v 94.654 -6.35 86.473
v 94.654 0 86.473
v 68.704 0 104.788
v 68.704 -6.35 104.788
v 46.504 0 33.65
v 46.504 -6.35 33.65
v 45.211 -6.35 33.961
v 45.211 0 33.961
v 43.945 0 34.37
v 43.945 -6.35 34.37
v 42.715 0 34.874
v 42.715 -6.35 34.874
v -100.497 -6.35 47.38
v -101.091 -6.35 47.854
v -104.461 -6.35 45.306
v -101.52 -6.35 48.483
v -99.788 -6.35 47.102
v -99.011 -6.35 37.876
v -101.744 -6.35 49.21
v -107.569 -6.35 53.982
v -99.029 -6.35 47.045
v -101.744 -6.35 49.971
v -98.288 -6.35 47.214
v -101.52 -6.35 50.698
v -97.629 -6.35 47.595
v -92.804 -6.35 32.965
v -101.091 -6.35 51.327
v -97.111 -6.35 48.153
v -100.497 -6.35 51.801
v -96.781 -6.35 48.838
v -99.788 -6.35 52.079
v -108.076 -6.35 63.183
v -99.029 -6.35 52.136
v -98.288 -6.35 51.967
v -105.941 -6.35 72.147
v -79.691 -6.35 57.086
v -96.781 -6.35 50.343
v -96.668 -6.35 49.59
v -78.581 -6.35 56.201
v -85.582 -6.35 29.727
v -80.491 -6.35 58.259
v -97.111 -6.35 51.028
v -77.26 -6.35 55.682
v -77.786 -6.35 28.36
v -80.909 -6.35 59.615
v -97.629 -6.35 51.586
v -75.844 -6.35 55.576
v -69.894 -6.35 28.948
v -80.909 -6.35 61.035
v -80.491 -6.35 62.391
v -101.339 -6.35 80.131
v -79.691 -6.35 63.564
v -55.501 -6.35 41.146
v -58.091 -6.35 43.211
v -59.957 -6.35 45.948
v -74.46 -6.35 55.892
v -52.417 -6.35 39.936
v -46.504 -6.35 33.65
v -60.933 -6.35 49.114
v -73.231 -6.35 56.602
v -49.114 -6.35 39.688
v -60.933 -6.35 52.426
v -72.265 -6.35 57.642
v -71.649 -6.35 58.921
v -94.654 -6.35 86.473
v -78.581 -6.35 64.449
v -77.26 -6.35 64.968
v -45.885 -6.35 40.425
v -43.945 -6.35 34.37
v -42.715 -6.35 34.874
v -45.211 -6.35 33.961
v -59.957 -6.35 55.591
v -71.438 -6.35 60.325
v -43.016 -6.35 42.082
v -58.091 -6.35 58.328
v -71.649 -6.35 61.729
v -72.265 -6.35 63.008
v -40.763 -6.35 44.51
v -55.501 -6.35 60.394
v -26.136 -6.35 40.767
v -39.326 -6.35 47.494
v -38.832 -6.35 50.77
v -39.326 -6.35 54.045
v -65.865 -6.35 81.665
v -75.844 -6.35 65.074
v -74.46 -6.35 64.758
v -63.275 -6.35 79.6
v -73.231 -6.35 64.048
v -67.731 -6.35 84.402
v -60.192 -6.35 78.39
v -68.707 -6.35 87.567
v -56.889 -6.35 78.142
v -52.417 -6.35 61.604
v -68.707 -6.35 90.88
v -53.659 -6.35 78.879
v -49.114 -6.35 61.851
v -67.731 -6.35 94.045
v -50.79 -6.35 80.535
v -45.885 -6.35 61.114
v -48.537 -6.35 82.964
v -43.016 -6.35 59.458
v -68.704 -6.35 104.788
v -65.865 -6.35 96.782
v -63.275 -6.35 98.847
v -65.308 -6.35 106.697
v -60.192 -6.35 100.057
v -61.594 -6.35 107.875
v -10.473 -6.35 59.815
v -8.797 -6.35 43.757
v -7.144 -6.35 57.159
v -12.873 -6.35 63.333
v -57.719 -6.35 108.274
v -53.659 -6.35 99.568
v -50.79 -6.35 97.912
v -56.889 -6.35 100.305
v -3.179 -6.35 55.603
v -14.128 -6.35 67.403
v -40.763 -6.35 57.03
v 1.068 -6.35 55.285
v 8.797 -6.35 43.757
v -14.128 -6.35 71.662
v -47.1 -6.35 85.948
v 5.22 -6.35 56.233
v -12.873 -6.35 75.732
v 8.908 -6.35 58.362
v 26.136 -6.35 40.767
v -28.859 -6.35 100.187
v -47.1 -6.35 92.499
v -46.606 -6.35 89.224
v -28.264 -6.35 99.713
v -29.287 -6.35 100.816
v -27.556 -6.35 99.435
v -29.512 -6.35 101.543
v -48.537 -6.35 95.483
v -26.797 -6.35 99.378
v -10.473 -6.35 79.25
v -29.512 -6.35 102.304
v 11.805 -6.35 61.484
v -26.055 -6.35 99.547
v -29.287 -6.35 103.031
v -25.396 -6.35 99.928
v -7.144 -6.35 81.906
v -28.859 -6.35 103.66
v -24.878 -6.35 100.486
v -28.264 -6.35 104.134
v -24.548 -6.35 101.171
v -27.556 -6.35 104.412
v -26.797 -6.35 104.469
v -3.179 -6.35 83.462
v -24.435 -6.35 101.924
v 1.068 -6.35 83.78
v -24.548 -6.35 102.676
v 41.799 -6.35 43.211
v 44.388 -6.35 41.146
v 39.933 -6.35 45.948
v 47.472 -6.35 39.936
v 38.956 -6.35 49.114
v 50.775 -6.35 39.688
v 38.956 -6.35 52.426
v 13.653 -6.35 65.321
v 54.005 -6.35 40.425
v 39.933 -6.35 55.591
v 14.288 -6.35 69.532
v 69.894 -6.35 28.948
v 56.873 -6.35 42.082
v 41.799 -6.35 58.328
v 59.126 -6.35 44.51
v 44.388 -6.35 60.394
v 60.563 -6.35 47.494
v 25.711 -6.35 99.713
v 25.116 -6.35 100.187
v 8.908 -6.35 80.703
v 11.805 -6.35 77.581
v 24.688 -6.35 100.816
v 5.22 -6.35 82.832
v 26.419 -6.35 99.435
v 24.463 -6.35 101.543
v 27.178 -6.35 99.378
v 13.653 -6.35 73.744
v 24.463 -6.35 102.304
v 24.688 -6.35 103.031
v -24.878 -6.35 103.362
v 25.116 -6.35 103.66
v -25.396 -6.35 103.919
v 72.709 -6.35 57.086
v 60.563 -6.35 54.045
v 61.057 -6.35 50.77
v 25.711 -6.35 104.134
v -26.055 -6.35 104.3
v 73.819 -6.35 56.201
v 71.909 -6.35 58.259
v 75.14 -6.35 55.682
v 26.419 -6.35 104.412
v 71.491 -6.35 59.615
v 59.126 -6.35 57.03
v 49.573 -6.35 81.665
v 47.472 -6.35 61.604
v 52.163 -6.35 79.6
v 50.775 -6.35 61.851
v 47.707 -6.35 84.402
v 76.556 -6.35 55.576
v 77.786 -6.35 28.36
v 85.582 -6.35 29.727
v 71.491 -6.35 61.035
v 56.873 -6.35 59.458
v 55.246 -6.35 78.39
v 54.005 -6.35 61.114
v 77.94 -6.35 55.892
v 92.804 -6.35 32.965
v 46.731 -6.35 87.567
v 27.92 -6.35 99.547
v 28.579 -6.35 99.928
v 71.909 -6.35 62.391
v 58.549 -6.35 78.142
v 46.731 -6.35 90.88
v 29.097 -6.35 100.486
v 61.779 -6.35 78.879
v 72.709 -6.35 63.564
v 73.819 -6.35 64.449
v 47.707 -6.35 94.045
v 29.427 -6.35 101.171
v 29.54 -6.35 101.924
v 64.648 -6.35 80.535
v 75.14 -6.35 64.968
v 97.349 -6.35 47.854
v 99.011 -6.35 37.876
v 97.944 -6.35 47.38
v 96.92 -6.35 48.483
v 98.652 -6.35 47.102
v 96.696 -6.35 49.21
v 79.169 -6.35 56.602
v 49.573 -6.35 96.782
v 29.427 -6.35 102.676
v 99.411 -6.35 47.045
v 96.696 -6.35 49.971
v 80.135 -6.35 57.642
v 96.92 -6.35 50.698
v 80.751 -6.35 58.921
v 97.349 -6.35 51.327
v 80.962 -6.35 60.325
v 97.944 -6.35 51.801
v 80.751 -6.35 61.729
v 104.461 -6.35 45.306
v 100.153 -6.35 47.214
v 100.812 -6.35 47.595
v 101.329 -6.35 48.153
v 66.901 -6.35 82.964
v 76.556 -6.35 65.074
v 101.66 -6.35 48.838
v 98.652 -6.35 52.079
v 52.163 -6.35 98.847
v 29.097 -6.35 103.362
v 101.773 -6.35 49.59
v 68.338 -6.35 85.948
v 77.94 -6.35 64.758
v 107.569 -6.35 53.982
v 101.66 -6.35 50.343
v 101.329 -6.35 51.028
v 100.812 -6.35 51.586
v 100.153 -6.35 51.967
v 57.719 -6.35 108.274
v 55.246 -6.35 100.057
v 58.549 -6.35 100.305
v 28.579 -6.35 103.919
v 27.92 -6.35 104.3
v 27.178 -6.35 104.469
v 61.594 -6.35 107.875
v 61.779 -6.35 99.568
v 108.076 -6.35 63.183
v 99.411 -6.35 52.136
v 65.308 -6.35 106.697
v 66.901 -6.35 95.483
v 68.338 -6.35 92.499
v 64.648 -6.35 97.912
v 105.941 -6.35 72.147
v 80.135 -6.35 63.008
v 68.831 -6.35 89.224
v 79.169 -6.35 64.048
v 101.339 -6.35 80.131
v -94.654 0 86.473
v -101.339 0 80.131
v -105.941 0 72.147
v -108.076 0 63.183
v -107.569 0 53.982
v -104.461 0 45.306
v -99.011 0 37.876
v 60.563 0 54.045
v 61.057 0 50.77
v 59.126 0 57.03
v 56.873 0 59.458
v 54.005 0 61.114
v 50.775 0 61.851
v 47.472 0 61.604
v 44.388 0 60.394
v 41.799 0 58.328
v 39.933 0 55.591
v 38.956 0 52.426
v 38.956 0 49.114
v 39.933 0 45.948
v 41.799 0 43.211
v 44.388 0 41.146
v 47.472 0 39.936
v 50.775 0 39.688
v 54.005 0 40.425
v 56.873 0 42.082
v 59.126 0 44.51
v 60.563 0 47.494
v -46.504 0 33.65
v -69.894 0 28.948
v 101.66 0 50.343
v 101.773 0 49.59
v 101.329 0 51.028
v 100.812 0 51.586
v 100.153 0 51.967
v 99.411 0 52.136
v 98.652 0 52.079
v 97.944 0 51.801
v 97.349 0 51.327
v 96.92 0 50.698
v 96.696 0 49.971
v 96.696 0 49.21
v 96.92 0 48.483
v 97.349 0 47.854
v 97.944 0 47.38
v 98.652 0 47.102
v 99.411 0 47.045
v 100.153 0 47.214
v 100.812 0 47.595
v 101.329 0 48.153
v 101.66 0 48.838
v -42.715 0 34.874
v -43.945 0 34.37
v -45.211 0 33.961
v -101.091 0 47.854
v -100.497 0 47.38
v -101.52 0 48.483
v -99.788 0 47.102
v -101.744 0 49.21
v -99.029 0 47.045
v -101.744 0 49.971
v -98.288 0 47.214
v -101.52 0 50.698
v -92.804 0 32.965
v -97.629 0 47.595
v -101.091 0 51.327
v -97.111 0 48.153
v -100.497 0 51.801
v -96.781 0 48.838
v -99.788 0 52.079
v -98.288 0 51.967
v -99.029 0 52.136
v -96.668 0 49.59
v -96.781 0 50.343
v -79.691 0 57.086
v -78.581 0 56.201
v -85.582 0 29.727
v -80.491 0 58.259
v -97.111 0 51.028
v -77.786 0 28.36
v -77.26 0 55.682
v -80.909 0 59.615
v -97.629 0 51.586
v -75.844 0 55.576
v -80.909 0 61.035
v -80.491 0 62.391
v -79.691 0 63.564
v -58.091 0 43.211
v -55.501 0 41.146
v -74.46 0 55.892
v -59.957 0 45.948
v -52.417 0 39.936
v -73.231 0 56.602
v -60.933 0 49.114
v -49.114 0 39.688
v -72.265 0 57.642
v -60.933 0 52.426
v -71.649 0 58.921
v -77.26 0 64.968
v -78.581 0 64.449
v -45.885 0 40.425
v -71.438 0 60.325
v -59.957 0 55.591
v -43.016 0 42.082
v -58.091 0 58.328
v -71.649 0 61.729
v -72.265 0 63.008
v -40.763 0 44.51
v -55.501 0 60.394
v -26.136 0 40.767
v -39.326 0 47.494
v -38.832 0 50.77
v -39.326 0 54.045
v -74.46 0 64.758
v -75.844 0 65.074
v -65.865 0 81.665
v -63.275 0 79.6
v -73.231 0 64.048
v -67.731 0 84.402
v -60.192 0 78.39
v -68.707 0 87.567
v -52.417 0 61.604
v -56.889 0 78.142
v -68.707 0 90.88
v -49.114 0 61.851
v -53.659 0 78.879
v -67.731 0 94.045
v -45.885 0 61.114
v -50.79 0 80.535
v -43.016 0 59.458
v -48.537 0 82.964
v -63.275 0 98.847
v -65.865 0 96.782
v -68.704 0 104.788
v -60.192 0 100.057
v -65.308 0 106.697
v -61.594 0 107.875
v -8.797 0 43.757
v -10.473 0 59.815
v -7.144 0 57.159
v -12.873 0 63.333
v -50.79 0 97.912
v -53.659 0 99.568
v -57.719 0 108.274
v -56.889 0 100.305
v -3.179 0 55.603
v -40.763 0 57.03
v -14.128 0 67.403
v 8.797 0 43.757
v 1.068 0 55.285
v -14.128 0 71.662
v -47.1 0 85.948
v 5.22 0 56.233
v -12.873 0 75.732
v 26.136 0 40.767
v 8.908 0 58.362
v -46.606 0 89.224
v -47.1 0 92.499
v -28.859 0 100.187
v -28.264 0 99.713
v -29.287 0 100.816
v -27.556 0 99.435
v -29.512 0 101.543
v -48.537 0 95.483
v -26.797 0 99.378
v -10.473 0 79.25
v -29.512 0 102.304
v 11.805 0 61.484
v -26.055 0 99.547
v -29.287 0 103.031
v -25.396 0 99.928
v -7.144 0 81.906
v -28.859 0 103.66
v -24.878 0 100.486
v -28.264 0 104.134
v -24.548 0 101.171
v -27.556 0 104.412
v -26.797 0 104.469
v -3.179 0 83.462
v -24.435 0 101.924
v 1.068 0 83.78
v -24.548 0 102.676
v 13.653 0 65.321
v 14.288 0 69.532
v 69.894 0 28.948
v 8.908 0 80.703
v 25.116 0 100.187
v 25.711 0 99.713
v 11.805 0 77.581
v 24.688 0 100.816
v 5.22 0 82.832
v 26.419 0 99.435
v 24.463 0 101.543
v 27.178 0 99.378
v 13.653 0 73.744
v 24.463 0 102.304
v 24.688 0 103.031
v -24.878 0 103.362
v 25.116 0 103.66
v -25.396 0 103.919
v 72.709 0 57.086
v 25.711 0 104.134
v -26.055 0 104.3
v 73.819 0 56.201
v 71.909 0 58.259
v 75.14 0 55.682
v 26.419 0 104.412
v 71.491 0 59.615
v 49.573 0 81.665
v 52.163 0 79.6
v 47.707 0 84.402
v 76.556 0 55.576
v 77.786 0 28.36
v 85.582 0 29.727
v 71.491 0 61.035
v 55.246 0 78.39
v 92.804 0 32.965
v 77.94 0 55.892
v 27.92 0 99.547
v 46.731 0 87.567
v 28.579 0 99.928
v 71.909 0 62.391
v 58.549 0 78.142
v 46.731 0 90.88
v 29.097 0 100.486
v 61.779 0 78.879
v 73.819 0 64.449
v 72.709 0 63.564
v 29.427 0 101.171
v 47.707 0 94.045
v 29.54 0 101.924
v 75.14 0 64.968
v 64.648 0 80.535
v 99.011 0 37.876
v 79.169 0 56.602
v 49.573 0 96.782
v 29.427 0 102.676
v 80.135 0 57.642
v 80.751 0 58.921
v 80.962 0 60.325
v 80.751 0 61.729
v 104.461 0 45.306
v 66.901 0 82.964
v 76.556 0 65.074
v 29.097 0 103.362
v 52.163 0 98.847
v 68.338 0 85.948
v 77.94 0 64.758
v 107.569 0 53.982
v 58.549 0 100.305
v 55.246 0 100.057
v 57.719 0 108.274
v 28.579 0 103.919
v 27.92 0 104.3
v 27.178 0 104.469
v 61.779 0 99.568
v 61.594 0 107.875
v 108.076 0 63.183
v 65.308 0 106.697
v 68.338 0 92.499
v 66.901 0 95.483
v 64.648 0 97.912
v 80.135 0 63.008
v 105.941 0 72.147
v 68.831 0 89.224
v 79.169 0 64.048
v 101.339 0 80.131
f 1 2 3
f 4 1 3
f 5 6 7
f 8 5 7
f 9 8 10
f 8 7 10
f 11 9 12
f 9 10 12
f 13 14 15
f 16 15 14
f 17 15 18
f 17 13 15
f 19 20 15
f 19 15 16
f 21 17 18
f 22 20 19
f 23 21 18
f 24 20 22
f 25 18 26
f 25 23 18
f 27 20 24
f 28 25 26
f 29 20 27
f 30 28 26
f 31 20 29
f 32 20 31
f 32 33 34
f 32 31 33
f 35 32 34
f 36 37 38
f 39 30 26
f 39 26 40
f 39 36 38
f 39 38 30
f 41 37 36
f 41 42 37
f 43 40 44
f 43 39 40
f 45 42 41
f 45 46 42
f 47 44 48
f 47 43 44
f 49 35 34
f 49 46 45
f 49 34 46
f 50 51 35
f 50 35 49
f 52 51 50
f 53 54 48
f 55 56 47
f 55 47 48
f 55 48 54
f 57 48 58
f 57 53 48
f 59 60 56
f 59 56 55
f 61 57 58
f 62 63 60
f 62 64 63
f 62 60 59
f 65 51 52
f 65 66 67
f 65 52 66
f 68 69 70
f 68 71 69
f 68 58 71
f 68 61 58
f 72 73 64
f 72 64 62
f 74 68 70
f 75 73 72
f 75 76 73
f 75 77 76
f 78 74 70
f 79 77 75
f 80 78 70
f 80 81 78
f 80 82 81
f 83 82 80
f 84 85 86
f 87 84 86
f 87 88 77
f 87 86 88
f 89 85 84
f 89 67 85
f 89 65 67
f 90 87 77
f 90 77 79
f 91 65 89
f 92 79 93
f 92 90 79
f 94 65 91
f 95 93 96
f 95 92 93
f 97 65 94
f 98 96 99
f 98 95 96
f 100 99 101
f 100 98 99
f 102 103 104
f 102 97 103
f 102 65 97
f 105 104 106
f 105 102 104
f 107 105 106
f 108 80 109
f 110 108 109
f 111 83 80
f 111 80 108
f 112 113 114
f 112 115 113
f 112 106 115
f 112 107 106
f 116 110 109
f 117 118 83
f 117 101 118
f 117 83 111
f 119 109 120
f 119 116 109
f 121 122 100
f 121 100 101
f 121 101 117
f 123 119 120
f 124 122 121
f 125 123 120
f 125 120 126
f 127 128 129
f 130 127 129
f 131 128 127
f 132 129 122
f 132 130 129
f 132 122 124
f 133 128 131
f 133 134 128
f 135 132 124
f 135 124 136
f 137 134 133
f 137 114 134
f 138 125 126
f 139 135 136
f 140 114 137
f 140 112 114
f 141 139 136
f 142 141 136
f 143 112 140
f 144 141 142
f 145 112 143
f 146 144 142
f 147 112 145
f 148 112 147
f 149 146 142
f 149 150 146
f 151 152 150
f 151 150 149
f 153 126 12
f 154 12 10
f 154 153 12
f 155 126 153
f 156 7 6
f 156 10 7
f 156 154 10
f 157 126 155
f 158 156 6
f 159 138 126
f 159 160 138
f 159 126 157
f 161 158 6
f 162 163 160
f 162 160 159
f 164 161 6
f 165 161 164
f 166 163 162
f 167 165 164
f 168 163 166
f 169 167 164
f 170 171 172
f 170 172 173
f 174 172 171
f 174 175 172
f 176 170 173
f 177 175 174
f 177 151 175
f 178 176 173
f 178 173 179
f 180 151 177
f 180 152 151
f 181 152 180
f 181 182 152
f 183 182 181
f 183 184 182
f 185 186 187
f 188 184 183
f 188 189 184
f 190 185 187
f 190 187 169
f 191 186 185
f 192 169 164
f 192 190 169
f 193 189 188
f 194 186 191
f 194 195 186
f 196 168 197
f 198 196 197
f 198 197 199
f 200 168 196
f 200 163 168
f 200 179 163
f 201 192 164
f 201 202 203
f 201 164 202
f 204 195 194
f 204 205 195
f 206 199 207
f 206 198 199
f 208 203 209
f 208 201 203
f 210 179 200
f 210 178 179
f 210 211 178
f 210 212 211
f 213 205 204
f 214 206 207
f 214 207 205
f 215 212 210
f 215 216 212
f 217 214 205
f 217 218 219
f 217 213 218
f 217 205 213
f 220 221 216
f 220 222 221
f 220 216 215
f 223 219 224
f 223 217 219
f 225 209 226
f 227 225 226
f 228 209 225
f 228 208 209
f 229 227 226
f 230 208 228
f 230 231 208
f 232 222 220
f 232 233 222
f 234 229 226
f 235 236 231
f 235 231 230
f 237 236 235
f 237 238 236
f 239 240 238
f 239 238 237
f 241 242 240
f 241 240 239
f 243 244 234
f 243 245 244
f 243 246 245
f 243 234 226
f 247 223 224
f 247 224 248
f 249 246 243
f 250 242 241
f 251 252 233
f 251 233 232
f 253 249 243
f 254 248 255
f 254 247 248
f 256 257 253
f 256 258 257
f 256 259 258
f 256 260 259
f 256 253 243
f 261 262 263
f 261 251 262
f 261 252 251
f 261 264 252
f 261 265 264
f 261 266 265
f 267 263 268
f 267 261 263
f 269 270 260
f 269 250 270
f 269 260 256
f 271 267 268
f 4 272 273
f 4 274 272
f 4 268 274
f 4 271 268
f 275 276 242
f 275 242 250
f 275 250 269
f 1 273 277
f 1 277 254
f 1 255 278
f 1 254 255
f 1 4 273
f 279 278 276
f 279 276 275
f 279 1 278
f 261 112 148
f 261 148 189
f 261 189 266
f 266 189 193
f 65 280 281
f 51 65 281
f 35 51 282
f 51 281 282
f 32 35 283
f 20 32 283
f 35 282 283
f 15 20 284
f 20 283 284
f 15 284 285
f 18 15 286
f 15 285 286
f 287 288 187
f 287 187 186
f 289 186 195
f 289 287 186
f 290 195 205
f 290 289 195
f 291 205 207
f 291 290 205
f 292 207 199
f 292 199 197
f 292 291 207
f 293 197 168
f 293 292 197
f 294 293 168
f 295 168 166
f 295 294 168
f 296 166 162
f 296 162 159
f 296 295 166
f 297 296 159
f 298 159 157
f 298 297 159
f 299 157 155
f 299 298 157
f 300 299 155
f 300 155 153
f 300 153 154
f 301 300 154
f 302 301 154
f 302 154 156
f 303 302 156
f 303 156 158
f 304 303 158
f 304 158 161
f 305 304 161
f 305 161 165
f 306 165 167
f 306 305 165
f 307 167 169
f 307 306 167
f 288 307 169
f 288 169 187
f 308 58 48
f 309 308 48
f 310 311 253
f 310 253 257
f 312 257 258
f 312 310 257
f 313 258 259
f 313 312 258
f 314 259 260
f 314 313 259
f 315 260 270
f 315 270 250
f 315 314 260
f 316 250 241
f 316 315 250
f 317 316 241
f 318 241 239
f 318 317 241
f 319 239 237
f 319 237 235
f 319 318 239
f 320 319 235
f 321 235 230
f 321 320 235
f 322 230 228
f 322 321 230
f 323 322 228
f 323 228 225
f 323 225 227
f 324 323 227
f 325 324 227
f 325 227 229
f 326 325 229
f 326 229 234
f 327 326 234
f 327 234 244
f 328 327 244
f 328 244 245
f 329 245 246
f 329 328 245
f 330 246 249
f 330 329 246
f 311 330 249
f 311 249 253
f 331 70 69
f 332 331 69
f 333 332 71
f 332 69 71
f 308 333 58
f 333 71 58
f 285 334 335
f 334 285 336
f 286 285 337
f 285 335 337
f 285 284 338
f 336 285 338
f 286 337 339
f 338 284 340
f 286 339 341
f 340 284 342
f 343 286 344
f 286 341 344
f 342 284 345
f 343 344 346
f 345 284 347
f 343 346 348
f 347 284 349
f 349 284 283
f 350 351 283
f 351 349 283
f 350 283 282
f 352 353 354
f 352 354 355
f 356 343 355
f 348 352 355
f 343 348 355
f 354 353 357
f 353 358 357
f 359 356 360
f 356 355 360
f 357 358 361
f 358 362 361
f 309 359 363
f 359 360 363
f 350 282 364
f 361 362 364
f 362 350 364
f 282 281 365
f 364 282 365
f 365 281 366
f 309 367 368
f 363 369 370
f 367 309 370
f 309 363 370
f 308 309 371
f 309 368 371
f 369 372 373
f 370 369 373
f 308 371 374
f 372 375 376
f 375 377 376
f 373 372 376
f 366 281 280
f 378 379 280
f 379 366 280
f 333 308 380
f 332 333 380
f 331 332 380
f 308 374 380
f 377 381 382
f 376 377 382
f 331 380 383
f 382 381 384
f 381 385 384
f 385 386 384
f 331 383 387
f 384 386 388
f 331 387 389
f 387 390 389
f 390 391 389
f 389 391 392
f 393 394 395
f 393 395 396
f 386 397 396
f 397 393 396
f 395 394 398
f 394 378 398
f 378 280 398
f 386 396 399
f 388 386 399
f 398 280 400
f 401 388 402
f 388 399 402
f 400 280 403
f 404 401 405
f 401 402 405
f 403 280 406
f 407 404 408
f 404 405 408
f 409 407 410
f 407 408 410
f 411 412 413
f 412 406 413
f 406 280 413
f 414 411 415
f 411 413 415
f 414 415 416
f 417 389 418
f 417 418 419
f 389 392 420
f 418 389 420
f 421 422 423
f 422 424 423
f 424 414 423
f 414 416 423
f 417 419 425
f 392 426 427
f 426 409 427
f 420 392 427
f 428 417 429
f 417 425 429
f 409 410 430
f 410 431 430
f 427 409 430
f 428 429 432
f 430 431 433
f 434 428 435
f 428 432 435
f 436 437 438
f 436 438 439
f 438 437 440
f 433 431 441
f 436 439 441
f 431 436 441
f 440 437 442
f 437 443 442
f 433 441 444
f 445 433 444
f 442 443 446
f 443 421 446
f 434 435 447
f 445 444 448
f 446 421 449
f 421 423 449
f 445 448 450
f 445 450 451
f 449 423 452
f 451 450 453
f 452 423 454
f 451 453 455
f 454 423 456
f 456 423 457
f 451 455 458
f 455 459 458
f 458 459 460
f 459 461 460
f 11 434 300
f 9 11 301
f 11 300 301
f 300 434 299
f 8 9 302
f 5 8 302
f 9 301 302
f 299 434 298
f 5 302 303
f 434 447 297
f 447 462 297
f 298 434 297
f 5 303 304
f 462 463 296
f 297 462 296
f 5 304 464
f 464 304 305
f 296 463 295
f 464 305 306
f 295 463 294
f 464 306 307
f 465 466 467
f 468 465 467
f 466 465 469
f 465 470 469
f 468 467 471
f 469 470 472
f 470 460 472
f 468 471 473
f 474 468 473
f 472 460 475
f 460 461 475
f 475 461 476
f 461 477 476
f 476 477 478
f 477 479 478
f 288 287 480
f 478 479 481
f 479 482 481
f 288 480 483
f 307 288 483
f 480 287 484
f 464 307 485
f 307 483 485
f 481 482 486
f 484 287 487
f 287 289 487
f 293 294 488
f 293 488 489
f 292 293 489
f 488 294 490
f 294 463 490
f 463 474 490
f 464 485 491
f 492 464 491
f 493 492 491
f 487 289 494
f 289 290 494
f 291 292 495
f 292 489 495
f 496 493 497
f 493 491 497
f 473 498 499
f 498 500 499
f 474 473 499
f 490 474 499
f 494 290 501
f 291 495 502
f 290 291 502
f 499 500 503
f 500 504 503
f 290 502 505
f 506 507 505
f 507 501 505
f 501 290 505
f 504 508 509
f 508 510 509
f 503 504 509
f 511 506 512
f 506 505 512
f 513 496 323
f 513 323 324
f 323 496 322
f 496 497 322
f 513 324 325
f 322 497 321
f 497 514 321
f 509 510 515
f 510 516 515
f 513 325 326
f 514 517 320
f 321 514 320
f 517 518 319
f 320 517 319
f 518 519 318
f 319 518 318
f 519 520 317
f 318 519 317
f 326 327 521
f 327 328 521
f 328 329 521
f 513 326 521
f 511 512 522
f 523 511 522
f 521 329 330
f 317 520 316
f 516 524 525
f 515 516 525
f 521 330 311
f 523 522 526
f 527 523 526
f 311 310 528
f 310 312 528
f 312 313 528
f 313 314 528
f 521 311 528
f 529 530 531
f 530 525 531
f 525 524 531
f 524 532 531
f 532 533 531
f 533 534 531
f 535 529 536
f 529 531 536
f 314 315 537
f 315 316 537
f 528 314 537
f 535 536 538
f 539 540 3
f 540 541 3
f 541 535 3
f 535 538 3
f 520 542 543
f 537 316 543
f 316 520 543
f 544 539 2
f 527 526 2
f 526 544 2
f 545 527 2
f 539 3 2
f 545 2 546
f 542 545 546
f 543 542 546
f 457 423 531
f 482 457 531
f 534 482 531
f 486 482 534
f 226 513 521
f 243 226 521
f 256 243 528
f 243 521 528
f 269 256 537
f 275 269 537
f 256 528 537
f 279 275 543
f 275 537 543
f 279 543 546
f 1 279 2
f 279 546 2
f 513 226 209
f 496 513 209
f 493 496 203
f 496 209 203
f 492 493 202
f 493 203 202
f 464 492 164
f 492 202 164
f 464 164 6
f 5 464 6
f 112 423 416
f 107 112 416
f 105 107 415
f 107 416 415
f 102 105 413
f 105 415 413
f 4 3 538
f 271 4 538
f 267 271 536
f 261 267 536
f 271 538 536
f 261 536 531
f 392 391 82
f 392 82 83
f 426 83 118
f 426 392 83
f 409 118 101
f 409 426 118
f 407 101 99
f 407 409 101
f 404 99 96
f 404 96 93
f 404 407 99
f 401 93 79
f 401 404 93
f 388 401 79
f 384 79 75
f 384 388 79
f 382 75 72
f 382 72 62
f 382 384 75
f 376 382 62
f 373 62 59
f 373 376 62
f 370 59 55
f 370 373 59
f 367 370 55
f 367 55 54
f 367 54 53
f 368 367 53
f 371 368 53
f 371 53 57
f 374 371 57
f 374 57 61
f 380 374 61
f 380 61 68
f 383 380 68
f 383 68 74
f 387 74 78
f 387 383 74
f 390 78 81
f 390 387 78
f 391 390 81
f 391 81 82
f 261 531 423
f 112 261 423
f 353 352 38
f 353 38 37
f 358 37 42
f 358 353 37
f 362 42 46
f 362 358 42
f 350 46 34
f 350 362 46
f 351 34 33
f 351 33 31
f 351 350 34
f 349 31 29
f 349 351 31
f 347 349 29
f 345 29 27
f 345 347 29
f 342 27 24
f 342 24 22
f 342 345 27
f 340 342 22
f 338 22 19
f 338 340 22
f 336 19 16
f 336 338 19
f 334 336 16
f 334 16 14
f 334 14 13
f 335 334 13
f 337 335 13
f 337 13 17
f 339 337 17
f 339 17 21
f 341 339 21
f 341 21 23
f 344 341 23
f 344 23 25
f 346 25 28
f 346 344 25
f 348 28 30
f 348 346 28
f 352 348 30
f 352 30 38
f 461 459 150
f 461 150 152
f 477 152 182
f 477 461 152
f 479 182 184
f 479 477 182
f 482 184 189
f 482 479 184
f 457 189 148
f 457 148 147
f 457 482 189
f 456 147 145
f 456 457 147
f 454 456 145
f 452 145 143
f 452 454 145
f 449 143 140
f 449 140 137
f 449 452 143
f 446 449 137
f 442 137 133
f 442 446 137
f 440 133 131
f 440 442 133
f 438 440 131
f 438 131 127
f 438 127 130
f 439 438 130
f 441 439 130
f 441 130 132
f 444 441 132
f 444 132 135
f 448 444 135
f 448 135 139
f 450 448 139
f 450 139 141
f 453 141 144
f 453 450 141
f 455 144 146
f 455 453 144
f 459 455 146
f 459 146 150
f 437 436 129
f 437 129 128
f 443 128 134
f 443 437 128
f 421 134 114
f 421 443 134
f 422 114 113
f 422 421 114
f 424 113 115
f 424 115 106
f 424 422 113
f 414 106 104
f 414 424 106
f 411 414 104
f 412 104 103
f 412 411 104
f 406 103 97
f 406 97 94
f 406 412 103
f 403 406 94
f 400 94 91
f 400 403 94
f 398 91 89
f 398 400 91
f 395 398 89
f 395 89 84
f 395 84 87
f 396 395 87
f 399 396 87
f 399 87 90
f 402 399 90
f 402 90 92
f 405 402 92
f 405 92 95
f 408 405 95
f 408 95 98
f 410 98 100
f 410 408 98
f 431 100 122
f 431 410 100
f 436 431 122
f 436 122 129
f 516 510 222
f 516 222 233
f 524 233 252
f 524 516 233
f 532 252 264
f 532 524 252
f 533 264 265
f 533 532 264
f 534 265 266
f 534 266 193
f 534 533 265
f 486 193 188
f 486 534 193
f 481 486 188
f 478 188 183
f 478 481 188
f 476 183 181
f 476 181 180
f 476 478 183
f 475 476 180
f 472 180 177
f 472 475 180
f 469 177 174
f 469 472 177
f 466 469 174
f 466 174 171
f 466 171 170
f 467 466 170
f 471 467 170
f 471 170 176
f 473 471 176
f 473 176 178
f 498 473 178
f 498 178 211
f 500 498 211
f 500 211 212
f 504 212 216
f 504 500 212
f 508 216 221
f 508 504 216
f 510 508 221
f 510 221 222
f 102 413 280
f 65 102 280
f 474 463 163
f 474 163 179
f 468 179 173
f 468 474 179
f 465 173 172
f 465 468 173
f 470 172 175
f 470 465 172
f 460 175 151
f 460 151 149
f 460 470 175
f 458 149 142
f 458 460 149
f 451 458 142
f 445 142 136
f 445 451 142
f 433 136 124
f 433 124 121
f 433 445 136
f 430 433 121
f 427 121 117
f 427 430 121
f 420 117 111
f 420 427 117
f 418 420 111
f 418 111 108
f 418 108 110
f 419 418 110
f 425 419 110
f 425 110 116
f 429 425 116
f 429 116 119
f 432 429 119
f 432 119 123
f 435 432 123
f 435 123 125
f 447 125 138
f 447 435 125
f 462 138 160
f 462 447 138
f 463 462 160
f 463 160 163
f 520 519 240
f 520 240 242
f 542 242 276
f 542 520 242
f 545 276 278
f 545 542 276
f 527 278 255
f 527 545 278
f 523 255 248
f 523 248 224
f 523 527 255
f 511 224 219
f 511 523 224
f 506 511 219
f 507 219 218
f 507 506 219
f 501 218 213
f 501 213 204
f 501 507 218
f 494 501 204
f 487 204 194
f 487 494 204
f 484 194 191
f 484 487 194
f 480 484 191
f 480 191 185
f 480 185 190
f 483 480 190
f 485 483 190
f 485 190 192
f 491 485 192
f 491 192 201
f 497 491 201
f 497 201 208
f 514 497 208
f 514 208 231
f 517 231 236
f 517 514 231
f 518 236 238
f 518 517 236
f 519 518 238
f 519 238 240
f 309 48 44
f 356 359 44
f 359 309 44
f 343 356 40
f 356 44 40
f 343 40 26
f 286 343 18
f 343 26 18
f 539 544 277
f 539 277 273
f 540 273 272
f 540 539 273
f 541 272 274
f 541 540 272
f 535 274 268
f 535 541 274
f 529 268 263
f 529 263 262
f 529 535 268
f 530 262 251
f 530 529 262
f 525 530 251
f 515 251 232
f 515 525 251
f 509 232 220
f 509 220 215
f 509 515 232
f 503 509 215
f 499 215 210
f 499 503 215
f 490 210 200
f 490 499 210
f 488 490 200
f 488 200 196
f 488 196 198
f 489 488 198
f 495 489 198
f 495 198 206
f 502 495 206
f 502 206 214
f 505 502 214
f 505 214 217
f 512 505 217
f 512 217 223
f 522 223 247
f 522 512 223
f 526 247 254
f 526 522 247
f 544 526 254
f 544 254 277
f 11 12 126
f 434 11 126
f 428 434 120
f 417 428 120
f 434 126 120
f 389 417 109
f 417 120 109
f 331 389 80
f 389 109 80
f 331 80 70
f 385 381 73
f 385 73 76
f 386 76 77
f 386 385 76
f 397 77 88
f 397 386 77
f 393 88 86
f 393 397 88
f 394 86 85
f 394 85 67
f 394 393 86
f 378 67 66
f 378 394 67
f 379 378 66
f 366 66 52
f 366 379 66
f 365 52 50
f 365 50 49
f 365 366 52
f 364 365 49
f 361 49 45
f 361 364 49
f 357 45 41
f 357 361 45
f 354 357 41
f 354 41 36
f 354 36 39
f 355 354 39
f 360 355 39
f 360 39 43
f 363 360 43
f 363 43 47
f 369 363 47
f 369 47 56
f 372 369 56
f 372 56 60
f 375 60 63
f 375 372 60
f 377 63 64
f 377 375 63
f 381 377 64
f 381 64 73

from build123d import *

# Parameters (mm, degrees)
F0_R     = 2.5527
F0_R_2   = 4.7625
F0_R_3   = 11.1125
F0_R_4   = 14.2875
F1_DEPTH = 6.35
F3_DEPTH = 25.4


with BuildPart() as f1:
    # F0 (on Front) → F1 (new body)
    with BuildSketch(Plane.XZ):
        with BuildLine():
            ThreePointArc((-94.654118, 86.472687), (-108.076175, 63.182526), (-99.010505, 37.876462))
            Line((-99.010505, 37.876462), (-43.757367, -18.267594))
            ThreePointArc((-43.757367, -18.267594), (-41.627815, -19.810445), (-39.111045, -20.572845))
            Line((-39.111045, -20.572845), (-3.033135, -25.206036))
            ThreePointArc((-3.033135, -25.206036), (0, -25.4), (3.033135, -25.206036))
            Line((3.033135, -25.206036), (39.111045, -20.572845))
            ThreePointArc((39.111045, -20.572845), (41.627815, -19.810445), (43.757367, -18.267594))
            Line((43.757367, -18.267594), (99.010505, 37.876462))
            ThreePointArc((99.010505, 37.876462), (108.076175, 63.182526), (94.654118, 86.472687))
            Line((94.654118, 86.472687), (68.703576, 104.787667))
            ThreePointArc((68.703576, 104.787667), (63.481204, 107.381191), (57.718982, 108.273567))
            Line((57.718982, 108.273567), (-57.718982, 108.273567))
            ThreePointArc((-57.718982, 108.273567), (-63.481204, 107.381191), (-68.703576, 104.787667))
            Line((-68.703576, 104.787667), (-94.654118, 86.472687))
        make_face()
        with Locations((-38.1, -12.7)):
            Circle(F0_R, mode=Mode.SUBTRACT)
        with Locations((-38.1, 12.7)):
            Circle(F0_R, mode=Mode.SUBTRACT)
        with Locations((38.1, -12.7)):
            Circle(F0_R, mode=Mode.SUBTRACT)
        with Locations((38.1, 12.7)):
            Circle(F0_R, mode=Mode.SUBTRACT)
        with Locations((-99.220218, 49.590496)):
            Circle(F0_R, mode=Mode.SUBTRACT)
        with Locations((-76.2, 60.325)):
            Circle(F0_R_2, mode=Mode.SUBTRACT)
        with Locations((-49.944684, 50.769793)):
            Circle(F0_R_3, mode=Mode.SUBTRACT)
        with Locations((-57.718982, 89.223567)):
            Circle(F0_R_3, mode=Mode.SUBTRACT)
        with Locations((-26.9875, 101.923567)):
            Circle(F0_R, mode=Mode.SUBTRACT)
        with Locations((49.944684, 50.769793)):
            Circle(F0_R_3, mode=Mode.SUBTRACT)
        with Locations((0, 69.5325)):
            Circle(F0_R_4, mode=Mode.SUBTRACT)
        with Locations((99.220218, 49.590496)):
            Circle(F0_R, mode=Mode.SUBTRACT)
        with Locations((76.2, 60.325)):
            Circle(F0_R_2, mode=Mode.SUBTRACT)
        with Locations((26.9875, 101.923567)):
            Circle(F0_R, mode=Mode.SUBTRACT)
        with Locations((57.718982, 89.223567)):
            Circle(F0_R_3, mode=Mode.SUBTRACT)
    extrude(amount=F1_DEPTH)

    # F2 (on face) → F3 (cut)
    with BuildSketch(Plane.XZ.offset(6.35)):
        with BuildLine():
            ThreePointArc((-69.893575, 28.948496), (-85.582074, 29.72708), (-99.010505, 37.876462))
            Line((-99.010505, 37.876462), (-99.010505, -25.4))
            Line((-99.010505, -25.4), (99.010505, -25.4))
            Line((99.010505, -25.4), (99.010505, 37.876462))
            ThreePointArc((99.010505, 37.876462), (85.582074, 29.72708), (69.893575, 28.948496))
            Line((69.893575, 28.948496), (46.503678, 33.649677))
            ThreePointArc((46.503678, 33.649677), (44.574094, 34.153667), (42.714559, 34.874379))
            ThreePointArc((42.714559, 34.874379), (0, 44.1325), (-42.714559, 34.874379))
            ThreePointArc((-42.714559, 34.874379), (-44.574094, 34.153667), (-46.503678, 33.649677))
            Line((-46.503678, 33.649677), (-69.893575, 28.948496))
        make_face()
    extrude(amount=-F3_DEPTH, mode=Mode.SUBTRACT)


solid = f1.part
